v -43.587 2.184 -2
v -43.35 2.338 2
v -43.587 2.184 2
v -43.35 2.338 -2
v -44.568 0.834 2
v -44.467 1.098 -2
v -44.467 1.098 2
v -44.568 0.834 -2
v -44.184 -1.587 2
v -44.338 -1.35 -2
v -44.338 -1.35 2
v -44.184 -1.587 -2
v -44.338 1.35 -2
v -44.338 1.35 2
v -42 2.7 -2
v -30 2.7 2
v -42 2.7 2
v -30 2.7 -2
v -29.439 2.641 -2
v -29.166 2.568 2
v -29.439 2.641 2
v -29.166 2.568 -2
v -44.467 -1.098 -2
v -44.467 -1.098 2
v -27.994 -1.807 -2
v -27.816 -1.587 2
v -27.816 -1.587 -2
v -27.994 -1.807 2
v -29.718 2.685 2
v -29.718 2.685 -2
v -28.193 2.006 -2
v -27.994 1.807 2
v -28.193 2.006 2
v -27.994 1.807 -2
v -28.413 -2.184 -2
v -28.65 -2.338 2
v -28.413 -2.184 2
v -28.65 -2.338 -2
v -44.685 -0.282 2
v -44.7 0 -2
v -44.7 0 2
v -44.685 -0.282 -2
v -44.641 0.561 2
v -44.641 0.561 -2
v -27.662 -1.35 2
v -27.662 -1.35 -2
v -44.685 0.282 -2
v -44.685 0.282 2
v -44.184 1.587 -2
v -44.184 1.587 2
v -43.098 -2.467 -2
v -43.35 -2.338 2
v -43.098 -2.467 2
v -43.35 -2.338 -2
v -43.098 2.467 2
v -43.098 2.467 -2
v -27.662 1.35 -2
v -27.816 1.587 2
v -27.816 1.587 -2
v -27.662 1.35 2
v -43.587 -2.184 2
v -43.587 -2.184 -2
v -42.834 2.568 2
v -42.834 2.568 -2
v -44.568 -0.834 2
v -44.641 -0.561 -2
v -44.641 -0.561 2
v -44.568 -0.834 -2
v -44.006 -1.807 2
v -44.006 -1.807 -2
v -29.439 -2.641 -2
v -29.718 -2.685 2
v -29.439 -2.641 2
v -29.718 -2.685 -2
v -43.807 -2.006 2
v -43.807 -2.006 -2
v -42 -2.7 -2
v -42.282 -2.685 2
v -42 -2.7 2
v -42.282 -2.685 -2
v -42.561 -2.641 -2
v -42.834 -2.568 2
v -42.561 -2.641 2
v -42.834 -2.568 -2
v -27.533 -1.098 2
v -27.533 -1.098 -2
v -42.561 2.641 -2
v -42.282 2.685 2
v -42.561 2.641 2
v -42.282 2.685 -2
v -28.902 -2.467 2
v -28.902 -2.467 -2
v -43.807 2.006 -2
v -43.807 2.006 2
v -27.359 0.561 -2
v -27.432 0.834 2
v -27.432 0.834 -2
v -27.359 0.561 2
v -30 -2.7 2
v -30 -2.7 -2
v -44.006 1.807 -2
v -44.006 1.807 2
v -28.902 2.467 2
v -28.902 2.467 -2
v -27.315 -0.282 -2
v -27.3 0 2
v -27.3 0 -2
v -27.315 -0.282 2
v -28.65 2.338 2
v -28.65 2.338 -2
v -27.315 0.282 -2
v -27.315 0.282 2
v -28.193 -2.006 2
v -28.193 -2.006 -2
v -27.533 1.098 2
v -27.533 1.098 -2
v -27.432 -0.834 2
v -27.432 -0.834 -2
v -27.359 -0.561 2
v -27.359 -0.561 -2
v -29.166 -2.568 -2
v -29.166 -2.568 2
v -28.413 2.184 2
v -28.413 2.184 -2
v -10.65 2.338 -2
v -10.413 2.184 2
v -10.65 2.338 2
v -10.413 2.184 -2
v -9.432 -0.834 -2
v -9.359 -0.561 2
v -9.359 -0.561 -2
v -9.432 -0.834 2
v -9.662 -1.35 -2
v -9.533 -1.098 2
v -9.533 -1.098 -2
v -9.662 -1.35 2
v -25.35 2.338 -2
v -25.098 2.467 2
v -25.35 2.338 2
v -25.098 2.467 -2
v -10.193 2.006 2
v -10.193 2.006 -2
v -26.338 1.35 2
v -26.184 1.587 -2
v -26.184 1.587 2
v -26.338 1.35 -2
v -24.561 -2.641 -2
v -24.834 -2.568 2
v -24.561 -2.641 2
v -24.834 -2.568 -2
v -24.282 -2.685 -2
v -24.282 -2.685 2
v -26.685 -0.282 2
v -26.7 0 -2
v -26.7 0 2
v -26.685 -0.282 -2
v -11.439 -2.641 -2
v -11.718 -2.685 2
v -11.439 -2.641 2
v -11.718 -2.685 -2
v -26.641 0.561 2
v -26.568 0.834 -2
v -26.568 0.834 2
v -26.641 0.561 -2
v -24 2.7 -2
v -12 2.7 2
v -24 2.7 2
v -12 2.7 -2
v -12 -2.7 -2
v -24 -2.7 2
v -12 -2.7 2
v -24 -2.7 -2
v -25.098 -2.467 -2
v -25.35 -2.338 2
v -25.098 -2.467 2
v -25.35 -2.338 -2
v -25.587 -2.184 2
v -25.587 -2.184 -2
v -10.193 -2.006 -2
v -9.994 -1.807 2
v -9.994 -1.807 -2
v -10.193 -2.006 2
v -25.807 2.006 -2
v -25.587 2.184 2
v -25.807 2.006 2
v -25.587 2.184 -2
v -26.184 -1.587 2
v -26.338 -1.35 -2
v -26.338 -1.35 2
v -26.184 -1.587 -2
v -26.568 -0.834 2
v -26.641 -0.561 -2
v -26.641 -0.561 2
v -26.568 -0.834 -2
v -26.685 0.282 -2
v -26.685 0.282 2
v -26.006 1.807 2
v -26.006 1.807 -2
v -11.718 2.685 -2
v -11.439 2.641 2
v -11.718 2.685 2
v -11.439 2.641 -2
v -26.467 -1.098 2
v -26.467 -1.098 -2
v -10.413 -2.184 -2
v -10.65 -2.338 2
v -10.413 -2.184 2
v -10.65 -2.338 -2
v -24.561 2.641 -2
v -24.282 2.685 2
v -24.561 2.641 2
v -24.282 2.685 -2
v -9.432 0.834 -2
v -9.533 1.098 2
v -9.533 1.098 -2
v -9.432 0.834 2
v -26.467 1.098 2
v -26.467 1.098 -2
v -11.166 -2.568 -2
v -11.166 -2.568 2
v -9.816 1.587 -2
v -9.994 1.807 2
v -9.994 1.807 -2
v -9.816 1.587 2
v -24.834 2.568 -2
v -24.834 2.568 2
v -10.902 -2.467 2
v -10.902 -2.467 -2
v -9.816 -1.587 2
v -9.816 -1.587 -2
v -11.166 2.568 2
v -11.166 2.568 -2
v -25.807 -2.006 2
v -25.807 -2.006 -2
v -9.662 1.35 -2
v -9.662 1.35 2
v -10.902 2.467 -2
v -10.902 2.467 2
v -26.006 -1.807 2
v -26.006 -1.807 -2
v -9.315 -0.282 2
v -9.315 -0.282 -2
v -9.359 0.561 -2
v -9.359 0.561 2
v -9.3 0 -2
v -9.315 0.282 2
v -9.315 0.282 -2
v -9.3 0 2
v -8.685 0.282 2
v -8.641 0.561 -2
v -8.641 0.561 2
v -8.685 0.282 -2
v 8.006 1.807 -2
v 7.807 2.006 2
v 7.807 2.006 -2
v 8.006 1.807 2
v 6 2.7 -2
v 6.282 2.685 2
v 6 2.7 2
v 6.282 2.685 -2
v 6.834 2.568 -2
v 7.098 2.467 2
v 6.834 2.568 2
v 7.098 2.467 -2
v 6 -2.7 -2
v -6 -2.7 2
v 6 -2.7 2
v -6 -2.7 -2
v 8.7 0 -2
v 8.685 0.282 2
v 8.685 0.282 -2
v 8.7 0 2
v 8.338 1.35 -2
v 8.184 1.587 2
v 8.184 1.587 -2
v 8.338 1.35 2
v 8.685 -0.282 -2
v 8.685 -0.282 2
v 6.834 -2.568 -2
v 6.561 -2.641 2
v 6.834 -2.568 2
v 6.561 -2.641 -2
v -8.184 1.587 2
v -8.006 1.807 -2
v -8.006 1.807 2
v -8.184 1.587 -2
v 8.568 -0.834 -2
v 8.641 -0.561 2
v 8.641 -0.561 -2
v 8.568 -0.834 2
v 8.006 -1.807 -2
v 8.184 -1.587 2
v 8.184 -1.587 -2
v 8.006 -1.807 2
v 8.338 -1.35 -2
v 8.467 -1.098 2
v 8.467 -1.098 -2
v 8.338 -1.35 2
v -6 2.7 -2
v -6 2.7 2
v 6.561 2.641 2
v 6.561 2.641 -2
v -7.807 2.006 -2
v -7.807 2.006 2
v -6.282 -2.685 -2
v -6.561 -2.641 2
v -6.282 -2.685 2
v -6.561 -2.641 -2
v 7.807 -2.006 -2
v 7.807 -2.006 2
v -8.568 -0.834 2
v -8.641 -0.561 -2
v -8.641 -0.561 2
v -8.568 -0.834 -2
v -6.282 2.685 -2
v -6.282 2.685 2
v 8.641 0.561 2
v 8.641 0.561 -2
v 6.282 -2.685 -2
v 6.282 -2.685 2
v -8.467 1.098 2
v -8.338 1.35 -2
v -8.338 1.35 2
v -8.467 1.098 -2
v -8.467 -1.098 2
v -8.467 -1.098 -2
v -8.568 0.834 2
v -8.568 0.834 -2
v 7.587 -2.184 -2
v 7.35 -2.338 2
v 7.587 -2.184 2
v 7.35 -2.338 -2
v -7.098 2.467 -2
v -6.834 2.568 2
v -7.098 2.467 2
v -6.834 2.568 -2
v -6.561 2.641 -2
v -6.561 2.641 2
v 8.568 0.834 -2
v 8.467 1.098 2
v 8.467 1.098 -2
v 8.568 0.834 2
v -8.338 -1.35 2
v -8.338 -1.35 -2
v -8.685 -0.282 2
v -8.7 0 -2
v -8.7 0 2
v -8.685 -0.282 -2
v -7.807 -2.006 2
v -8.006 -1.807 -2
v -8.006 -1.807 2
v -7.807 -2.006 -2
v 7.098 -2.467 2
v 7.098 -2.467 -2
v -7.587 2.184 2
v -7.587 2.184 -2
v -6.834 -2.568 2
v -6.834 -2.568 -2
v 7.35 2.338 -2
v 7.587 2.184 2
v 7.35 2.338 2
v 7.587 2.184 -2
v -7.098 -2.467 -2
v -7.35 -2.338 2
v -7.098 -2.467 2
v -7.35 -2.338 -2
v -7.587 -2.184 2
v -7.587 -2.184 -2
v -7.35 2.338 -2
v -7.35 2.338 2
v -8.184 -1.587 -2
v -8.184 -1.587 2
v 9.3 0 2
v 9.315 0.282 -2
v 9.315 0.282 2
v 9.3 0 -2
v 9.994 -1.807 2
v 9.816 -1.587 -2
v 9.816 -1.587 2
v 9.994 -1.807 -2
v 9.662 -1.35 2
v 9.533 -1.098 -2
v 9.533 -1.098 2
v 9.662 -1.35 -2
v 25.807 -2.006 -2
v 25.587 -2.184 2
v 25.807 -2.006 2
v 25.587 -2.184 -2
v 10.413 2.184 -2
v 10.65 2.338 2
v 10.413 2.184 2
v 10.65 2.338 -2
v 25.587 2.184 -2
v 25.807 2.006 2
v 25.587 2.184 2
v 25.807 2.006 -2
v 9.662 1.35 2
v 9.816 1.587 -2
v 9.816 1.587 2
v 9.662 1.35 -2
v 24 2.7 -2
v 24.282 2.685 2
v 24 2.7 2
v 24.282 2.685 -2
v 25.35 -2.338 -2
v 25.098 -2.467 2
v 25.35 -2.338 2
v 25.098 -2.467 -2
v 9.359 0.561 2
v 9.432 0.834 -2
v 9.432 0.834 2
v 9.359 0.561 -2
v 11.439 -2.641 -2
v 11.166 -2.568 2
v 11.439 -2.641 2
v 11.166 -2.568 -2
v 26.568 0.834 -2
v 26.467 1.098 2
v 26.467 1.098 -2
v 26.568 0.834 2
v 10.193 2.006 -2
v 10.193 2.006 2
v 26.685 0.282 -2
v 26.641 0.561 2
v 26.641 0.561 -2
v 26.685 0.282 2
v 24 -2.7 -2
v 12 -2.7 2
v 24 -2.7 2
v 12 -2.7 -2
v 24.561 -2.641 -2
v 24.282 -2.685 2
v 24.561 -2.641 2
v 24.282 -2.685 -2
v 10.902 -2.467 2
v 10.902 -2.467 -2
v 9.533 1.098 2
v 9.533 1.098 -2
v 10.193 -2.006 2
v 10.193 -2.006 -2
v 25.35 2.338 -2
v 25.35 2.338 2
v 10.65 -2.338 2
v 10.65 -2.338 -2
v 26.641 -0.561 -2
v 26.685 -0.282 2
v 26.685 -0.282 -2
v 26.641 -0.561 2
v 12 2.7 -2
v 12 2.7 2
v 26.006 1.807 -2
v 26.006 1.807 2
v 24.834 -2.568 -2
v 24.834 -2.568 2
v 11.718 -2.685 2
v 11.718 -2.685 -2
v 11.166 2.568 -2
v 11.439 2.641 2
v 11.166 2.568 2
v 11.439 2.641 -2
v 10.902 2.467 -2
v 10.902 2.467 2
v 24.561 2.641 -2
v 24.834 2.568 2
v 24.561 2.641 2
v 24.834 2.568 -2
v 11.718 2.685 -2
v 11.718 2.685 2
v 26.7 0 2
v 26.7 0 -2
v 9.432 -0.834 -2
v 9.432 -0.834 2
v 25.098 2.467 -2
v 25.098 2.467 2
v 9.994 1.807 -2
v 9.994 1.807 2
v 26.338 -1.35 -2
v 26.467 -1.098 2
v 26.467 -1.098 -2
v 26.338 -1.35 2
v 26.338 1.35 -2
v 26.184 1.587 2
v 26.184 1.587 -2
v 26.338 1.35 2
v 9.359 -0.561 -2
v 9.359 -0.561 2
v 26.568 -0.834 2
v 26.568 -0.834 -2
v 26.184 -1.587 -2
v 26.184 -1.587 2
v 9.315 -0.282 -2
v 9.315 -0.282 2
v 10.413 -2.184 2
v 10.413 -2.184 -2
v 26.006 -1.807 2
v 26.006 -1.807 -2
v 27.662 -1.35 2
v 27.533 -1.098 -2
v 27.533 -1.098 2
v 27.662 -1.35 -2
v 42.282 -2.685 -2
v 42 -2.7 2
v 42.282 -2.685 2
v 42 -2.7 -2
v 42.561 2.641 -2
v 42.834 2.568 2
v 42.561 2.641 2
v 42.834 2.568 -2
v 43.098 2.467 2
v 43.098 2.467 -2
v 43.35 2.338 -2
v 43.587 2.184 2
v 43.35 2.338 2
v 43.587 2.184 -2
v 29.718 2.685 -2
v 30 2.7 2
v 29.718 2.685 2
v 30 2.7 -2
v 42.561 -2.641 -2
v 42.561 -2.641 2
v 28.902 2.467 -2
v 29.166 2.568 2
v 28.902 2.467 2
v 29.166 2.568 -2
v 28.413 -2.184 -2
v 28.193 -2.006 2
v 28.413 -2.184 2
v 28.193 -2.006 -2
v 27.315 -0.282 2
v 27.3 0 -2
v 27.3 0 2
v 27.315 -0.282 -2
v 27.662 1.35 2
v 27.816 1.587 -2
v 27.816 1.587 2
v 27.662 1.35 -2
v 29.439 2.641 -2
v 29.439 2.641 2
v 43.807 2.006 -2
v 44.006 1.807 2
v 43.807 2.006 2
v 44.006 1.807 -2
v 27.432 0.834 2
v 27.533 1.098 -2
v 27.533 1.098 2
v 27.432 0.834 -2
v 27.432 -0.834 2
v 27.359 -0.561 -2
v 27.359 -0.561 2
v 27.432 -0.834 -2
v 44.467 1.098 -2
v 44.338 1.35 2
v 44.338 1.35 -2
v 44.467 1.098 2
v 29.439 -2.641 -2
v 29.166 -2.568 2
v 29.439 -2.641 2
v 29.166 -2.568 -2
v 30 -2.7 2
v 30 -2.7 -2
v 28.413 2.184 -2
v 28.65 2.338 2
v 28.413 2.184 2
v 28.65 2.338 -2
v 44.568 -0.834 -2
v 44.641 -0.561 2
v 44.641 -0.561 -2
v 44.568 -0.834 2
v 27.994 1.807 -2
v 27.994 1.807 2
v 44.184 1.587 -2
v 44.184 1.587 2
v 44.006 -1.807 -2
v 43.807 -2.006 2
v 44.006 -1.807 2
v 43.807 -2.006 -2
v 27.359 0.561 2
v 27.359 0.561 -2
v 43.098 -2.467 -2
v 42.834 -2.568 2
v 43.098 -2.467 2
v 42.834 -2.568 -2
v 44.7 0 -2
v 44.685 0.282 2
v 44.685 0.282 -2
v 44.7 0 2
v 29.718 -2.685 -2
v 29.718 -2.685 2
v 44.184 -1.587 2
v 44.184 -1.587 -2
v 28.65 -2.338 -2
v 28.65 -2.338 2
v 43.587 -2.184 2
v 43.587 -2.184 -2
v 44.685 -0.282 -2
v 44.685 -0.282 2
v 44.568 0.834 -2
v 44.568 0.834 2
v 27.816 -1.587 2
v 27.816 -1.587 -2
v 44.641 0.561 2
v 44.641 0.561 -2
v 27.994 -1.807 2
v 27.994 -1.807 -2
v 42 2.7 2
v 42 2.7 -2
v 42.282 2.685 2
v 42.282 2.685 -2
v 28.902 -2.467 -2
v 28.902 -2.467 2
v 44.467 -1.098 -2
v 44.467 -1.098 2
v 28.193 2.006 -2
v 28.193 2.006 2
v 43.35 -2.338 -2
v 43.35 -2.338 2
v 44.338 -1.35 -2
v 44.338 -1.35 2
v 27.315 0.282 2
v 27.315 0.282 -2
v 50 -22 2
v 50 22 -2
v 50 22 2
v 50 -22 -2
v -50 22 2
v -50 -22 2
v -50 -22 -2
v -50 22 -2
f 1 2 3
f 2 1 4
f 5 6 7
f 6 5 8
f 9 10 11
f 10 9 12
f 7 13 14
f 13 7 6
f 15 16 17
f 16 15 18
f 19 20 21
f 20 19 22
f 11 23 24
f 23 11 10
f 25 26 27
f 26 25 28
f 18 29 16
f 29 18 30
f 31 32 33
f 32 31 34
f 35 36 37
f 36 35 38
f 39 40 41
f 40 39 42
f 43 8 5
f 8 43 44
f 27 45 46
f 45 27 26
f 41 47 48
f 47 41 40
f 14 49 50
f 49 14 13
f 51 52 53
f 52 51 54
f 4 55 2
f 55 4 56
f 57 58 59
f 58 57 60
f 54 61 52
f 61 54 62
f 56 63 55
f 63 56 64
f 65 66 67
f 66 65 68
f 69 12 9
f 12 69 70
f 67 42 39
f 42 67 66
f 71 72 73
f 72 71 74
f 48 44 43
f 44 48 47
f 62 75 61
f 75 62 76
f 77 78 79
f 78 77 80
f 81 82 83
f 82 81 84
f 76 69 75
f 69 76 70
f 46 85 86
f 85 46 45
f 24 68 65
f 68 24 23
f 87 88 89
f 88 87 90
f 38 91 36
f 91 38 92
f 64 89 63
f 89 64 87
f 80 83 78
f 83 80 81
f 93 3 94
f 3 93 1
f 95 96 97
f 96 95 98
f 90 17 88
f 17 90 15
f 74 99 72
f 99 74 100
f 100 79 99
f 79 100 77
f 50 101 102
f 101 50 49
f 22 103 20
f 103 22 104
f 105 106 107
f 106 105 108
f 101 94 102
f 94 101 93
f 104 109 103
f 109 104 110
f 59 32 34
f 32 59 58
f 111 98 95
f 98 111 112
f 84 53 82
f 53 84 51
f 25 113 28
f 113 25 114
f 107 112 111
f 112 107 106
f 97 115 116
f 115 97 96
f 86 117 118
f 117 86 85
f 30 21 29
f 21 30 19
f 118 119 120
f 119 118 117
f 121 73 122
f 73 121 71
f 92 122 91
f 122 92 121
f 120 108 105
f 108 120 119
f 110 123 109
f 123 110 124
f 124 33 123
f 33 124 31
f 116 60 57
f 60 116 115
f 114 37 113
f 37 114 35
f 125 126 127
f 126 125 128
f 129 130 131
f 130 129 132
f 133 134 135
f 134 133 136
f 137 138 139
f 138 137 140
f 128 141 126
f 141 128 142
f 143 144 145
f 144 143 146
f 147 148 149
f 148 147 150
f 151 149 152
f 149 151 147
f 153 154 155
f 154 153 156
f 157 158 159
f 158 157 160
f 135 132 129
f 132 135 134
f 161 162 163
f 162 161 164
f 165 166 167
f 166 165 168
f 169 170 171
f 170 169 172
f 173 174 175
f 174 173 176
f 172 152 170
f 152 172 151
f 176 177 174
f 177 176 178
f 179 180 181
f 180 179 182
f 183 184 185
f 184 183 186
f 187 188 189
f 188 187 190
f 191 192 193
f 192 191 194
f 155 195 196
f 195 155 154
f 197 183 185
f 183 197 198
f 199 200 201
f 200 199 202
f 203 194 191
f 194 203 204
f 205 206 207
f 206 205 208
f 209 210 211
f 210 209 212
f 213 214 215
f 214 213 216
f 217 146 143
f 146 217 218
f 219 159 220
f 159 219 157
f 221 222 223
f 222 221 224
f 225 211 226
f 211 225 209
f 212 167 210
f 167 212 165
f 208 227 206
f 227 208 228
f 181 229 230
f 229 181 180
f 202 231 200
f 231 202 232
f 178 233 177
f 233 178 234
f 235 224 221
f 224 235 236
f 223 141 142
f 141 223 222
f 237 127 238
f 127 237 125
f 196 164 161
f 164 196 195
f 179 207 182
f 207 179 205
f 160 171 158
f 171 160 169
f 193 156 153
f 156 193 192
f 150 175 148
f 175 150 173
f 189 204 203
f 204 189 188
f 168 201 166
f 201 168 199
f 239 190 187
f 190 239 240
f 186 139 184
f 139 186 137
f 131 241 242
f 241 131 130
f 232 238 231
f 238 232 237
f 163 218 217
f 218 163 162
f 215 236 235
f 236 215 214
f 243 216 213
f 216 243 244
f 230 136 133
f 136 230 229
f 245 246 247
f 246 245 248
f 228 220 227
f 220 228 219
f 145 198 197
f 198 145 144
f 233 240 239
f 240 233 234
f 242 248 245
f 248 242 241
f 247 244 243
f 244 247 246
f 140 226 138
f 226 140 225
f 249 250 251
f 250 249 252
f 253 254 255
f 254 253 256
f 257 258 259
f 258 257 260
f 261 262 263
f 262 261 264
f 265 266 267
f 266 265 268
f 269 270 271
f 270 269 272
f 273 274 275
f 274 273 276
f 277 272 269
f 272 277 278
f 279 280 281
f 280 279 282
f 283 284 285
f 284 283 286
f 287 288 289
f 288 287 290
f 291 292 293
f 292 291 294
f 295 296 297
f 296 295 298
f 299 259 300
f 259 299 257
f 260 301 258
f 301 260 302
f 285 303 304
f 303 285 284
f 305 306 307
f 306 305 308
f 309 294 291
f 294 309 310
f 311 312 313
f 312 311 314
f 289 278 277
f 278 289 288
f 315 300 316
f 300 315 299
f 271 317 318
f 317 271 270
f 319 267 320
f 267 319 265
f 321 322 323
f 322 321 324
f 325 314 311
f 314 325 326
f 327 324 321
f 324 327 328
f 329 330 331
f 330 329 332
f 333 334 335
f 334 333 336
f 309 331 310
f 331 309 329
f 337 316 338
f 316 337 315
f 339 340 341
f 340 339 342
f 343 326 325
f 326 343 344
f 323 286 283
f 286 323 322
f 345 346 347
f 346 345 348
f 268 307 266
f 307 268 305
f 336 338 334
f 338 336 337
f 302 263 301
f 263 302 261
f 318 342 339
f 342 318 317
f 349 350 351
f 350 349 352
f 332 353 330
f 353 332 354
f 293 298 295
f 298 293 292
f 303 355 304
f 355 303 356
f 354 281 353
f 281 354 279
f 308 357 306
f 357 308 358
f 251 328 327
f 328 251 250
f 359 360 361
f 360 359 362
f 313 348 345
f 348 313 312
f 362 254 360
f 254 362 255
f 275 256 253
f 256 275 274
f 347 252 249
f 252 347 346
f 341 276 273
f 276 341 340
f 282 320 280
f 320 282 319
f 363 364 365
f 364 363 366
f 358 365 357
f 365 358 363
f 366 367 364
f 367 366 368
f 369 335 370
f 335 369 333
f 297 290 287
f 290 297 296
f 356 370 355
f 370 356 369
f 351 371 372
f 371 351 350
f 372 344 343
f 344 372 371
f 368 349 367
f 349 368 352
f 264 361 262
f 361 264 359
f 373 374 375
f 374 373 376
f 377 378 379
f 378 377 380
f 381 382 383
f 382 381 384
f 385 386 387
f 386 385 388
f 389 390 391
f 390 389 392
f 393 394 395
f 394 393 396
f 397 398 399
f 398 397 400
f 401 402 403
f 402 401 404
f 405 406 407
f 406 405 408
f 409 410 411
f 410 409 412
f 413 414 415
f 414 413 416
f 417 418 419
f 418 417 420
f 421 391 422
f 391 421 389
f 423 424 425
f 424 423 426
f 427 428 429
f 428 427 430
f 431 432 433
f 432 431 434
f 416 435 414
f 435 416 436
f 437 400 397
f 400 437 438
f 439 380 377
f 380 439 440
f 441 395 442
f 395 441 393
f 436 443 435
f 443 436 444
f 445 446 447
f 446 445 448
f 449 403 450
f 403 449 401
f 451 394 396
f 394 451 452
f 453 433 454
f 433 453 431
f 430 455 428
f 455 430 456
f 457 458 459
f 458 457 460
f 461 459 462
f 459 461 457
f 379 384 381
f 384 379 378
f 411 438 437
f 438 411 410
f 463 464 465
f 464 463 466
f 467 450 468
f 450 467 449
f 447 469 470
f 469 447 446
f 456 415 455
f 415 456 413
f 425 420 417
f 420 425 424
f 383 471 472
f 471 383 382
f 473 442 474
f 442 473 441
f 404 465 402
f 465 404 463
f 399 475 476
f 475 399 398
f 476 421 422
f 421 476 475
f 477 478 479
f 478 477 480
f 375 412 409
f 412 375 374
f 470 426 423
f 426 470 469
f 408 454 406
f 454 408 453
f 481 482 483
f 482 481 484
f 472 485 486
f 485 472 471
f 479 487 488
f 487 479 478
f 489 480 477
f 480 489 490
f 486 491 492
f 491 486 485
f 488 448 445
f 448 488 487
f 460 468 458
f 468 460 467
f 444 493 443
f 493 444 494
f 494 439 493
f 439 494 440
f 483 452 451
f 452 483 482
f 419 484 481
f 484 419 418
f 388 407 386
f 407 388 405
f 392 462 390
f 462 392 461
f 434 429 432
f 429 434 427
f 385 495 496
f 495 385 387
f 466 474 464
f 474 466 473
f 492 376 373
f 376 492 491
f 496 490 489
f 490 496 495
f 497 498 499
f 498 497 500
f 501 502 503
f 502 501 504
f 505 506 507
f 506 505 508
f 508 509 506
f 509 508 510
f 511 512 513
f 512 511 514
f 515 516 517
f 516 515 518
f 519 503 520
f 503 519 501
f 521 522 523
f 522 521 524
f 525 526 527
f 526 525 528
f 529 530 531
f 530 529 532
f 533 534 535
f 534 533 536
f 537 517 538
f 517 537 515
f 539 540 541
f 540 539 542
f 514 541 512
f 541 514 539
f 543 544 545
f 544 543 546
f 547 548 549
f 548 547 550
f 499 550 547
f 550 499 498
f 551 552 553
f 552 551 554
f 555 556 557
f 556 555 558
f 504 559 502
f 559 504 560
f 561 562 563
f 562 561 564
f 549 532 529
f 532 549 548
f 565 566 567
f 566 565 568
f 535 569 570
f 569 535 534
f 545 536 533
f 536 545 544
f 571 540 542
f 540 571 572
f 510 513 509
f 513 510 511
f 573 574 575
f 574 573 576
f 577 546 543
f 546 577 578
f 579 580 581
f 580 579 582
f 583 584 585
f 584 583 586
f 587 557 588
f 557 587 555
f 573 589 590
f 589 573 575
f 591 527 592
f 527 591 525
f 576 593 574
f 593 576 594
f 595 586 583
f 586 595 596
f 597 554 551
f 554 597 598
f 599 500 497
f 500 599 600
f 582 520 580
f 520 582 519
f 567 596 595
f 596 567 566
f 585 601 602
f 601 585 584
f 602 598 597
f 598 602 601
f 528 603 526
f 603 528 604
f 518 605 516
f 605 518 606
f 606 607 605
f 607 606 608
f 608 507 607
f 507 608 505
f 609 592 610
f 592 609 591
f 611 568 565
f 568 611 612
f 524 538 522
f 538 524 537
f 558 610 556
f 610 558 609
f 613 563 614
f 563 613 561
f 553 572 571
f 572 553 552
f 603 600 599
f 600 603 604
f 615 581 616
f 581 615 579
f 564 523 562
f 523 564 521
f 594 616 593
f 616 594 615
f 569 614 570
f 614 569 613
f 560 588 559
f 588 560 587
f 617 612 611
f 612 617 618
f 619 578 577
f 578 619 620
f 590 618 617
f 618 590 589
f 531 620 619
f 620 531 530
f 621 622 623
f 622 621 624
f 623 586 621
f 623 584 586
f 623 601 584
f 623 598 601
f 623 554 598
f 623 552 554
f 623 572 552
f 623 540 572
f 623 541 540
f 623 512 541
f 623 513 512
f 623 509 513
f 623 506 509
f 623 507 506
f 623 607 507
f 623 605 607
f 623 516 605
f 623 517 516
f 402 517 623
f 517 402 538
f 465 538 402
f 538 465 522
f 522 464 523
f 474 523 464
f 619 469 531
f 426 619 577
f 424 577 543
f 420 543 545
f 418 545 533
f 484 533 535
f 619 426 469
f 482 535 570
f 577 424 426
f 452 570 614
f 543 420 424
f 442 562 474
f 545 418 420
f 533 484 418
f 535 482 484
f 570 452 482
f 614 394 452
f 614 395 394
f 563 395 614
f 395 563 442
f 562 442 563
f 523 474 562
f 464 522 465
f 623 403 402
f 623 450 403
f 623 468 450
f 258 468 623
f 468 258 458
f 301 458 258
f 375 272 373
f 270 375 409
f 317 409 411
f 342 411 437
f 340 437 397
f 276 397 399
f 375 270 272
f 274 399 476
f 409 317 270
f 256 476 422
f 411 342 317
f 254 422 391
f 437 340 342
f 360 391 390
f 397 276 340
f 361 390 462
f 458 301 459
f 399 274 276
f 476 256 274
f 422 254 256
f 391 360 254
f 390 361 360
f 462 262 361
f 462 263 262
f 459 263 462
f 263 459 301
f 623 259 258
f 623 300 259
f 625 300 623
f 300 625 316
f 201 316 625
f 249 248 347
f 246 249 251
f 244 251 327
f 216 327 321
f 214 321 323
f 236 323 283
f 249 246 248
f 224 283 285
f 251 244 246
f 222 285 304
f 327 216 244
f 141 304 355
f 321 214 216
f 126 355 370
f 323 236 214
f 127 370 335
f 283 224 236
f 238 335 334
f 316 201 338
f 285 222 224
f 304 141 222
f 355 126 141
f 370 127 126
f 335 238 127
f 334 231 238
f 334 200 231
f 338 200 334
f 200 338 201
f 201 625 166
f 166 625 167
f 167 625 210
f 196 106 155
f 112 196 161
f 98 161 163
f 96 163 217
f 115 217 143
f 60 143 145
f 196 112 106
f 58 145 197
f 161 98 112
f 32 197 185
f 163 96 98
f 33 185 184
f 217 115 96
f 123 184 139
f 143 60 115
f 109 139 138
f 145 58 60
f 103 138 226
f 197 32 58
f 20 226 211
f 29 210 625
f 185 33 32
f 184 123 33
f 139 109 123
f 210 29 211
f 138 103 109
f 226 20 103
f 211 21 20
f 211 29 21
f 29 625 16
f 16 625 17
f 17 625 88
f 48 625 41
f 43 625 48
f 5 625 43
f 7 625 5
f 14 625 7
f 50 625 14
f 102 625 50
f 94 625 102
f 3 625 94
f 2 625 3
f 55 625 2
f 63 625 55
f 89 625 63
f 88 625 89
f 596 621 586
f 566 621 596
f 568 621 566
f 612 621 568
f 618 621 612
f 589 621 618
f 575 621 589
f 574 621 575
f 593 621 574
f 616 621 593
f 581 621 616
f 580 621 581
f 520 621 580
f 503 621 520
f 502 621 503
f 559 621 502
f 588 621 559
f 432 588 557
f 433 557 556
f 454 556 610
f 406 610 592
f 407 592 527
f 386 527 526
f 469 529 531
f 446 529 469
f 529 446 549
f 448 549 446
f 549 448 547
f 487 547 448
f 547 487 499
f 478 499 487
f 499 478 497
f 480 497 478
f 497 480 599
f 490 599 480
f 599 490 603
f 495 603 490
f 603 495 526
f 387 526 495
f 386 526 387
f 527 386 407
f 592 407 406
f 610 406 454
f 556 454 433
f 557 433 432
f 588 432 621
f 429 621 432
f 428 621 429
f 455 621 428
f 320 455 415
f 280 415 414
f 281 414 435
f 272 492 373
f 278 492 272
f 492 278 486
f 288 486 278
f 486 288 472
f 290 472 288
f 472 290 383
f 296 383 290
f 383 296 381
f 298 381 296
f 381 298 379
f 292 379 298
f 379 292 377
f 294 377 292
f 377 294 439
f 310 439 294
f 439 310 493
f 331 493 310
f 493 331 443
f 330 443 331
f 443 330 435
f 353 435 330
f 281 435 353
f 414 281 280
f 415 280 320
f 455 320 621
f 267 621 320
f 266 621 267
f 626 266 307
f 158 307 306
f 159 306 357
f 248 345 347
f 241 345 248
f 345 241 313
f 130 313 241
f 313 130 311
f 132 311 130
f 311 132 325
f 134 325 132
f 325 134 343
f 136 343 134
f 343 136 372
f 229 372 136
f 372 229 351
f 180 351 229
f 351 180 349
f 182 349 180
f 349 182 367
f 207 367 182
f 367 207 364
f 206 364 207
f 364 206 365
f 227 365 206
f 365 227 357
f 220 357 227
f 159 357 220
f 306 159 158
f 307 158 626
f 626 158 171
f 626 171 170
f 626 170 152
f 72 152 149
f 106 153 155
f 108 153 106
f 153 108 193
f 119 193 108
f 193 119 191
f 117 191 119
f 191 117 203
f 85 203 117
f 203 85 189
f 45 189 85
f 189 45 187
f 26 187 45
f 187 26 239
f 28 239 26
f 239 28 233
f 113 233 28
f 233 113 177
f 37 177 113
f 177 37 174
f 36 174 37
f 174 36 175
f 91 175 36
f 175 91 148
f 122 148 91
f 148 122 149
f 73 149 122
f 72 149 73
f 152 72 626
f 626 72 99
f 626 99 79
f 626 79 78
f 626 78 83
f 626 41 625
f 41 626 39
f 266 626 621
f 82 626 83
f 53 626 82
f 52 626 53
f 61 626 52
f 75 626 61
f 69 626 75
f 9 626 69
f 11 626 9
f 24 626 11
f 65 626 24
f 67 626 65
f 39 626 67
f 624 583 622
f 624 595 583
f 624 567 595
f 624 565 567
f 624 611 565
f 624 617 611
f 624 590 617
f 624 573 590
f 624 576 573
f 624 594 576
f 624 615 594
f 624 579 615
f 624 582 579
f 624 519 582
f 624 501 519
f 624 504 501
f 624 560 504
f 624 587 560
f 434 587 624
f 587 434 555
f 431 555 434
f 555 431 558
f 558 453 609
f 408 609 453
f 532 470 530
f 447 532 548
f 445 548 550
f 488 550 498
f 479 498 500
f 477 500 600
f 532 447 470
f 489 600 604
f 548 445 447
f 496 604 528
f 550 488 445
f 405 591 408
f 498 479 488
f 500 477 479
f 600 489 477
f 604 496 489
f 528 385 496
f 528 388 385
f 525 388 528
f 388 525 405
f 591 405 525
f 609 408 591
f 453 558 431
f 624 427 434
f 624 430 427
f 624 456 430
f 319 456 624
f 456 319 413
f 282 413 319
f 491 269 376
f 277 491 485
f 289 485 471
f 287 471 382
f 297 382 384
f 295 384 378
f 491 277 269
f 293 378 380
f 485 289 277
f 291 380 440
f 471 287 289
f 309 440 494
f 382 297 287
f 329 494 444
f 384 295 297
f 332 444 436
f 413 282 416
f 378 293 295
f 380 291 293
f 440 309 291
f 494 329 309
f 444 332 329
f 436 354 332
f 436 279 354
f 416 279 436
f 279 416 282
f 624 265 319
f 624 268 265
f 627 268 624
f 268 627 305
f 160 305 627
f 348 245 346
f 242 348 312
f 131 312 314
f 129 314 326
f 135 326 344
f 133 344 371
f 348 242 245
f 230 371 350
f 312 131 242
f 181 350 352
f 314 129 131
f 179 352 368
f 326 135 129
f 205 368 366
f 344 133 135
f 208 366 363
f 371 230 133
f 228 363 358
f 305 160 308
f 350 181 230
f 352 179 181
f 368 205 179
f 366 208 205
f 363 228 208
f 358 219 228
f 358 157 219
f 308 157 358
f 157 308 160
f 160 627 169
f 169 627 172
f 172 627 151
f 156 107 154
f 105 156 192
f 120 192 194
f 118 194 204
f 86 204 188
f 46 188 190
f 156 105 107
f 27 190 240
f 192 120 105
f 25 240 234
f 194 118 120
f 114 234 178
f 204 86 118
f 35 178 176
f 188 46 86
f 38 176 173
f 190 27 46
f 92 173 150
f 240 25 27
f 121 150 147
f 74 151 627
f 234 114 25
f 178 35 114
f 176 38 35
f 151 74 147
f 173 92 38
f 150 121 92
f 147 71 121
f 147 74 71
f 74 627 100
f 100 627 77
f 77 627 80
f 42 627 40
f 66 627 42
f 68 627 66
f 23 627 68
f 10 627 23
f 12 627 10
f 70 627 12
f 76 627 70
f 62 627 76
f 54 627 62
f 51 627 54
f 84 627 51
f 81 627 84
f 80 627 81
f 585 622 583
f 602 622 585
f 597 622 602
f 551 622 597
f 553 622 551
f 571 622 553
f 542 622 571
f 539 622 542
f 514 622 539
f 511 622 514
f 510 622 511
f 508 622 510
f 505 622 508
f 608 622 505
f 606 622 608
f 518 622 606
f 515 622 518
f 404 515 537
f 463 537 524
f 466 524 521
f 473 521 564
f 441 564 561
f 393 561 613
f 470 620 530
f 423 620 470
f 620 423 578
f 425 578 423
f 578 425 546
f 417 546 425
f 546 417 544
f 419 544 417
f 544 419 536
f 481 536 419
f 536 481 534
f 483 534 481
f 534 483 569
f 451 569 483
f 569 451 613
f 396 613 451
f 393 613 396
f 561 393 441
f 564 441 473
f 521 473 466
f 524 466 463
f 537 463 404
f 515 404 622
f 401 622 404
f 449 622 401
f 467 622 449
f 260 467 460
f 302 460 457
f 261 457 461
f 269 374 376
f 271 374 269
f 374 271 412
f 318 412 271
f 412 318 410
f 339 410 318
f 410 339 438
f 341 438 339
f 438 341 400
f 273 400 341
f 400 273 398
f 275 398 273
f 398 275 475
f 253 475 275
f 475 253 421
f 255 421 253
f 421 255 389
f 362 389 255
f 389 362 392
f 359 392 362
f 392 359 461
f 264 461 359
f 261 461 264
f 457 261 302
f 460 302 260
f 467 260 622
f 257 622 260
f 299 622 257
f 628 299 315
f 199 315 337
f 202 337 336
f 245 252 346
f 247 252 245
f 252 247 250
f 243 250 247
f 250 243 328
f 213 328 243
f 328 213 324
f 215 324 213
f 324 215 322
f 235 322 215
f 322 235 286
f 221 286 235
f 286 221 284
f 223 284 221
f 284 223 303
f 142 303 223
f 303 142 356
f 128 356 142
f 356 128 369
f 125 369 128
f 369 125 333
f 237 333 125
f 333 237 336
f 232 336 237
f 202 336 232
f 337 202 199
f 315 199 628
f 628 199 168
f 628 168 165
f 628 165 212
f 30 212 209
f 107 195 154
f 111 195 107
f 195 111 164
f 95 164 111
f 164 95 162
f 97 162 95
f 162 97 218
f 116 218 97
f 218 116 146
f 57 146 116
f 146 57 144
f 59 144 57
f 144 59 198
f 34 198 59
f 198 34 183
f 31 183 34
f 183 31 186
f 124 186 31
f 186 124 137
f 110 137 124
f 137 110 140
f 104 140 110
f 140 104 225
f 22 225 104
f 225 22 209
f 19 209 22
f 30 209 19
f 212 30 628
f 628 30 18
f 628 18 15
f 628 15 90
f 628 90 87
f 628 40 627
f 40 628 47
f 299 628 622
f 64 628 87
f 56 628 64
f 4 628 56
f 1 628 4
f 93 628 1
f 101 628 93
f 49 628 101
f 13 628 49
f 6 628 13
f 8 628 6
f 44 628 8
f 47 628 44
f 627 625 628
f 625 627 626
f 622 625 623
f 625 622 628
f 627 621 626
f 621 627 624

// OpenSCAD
// Slotted mounting plate.
$fn = 60;
eps = 0.02;
plate_l = 100;
plate_w = 44;
plate_t = 4;
slot_l = 12;
slot_d = 5.4;
module slot(x) { hull() { translate([x-slot_l/2,0,-plate_t/2-eps]) cylinder(d=slot_d,h=plate_t+2*eps); translate([x+slot_l/2,0,-plate_t/2-eps]) cylinder(d=slot_d,h=plate_t+2*eps); } }
difference() { cube([plate_l, plate_w, plate_t], center=true); for (i=[0:4]) slot(-plate_l/2+14+i*(plate_l-28)/max(1,4)); }
